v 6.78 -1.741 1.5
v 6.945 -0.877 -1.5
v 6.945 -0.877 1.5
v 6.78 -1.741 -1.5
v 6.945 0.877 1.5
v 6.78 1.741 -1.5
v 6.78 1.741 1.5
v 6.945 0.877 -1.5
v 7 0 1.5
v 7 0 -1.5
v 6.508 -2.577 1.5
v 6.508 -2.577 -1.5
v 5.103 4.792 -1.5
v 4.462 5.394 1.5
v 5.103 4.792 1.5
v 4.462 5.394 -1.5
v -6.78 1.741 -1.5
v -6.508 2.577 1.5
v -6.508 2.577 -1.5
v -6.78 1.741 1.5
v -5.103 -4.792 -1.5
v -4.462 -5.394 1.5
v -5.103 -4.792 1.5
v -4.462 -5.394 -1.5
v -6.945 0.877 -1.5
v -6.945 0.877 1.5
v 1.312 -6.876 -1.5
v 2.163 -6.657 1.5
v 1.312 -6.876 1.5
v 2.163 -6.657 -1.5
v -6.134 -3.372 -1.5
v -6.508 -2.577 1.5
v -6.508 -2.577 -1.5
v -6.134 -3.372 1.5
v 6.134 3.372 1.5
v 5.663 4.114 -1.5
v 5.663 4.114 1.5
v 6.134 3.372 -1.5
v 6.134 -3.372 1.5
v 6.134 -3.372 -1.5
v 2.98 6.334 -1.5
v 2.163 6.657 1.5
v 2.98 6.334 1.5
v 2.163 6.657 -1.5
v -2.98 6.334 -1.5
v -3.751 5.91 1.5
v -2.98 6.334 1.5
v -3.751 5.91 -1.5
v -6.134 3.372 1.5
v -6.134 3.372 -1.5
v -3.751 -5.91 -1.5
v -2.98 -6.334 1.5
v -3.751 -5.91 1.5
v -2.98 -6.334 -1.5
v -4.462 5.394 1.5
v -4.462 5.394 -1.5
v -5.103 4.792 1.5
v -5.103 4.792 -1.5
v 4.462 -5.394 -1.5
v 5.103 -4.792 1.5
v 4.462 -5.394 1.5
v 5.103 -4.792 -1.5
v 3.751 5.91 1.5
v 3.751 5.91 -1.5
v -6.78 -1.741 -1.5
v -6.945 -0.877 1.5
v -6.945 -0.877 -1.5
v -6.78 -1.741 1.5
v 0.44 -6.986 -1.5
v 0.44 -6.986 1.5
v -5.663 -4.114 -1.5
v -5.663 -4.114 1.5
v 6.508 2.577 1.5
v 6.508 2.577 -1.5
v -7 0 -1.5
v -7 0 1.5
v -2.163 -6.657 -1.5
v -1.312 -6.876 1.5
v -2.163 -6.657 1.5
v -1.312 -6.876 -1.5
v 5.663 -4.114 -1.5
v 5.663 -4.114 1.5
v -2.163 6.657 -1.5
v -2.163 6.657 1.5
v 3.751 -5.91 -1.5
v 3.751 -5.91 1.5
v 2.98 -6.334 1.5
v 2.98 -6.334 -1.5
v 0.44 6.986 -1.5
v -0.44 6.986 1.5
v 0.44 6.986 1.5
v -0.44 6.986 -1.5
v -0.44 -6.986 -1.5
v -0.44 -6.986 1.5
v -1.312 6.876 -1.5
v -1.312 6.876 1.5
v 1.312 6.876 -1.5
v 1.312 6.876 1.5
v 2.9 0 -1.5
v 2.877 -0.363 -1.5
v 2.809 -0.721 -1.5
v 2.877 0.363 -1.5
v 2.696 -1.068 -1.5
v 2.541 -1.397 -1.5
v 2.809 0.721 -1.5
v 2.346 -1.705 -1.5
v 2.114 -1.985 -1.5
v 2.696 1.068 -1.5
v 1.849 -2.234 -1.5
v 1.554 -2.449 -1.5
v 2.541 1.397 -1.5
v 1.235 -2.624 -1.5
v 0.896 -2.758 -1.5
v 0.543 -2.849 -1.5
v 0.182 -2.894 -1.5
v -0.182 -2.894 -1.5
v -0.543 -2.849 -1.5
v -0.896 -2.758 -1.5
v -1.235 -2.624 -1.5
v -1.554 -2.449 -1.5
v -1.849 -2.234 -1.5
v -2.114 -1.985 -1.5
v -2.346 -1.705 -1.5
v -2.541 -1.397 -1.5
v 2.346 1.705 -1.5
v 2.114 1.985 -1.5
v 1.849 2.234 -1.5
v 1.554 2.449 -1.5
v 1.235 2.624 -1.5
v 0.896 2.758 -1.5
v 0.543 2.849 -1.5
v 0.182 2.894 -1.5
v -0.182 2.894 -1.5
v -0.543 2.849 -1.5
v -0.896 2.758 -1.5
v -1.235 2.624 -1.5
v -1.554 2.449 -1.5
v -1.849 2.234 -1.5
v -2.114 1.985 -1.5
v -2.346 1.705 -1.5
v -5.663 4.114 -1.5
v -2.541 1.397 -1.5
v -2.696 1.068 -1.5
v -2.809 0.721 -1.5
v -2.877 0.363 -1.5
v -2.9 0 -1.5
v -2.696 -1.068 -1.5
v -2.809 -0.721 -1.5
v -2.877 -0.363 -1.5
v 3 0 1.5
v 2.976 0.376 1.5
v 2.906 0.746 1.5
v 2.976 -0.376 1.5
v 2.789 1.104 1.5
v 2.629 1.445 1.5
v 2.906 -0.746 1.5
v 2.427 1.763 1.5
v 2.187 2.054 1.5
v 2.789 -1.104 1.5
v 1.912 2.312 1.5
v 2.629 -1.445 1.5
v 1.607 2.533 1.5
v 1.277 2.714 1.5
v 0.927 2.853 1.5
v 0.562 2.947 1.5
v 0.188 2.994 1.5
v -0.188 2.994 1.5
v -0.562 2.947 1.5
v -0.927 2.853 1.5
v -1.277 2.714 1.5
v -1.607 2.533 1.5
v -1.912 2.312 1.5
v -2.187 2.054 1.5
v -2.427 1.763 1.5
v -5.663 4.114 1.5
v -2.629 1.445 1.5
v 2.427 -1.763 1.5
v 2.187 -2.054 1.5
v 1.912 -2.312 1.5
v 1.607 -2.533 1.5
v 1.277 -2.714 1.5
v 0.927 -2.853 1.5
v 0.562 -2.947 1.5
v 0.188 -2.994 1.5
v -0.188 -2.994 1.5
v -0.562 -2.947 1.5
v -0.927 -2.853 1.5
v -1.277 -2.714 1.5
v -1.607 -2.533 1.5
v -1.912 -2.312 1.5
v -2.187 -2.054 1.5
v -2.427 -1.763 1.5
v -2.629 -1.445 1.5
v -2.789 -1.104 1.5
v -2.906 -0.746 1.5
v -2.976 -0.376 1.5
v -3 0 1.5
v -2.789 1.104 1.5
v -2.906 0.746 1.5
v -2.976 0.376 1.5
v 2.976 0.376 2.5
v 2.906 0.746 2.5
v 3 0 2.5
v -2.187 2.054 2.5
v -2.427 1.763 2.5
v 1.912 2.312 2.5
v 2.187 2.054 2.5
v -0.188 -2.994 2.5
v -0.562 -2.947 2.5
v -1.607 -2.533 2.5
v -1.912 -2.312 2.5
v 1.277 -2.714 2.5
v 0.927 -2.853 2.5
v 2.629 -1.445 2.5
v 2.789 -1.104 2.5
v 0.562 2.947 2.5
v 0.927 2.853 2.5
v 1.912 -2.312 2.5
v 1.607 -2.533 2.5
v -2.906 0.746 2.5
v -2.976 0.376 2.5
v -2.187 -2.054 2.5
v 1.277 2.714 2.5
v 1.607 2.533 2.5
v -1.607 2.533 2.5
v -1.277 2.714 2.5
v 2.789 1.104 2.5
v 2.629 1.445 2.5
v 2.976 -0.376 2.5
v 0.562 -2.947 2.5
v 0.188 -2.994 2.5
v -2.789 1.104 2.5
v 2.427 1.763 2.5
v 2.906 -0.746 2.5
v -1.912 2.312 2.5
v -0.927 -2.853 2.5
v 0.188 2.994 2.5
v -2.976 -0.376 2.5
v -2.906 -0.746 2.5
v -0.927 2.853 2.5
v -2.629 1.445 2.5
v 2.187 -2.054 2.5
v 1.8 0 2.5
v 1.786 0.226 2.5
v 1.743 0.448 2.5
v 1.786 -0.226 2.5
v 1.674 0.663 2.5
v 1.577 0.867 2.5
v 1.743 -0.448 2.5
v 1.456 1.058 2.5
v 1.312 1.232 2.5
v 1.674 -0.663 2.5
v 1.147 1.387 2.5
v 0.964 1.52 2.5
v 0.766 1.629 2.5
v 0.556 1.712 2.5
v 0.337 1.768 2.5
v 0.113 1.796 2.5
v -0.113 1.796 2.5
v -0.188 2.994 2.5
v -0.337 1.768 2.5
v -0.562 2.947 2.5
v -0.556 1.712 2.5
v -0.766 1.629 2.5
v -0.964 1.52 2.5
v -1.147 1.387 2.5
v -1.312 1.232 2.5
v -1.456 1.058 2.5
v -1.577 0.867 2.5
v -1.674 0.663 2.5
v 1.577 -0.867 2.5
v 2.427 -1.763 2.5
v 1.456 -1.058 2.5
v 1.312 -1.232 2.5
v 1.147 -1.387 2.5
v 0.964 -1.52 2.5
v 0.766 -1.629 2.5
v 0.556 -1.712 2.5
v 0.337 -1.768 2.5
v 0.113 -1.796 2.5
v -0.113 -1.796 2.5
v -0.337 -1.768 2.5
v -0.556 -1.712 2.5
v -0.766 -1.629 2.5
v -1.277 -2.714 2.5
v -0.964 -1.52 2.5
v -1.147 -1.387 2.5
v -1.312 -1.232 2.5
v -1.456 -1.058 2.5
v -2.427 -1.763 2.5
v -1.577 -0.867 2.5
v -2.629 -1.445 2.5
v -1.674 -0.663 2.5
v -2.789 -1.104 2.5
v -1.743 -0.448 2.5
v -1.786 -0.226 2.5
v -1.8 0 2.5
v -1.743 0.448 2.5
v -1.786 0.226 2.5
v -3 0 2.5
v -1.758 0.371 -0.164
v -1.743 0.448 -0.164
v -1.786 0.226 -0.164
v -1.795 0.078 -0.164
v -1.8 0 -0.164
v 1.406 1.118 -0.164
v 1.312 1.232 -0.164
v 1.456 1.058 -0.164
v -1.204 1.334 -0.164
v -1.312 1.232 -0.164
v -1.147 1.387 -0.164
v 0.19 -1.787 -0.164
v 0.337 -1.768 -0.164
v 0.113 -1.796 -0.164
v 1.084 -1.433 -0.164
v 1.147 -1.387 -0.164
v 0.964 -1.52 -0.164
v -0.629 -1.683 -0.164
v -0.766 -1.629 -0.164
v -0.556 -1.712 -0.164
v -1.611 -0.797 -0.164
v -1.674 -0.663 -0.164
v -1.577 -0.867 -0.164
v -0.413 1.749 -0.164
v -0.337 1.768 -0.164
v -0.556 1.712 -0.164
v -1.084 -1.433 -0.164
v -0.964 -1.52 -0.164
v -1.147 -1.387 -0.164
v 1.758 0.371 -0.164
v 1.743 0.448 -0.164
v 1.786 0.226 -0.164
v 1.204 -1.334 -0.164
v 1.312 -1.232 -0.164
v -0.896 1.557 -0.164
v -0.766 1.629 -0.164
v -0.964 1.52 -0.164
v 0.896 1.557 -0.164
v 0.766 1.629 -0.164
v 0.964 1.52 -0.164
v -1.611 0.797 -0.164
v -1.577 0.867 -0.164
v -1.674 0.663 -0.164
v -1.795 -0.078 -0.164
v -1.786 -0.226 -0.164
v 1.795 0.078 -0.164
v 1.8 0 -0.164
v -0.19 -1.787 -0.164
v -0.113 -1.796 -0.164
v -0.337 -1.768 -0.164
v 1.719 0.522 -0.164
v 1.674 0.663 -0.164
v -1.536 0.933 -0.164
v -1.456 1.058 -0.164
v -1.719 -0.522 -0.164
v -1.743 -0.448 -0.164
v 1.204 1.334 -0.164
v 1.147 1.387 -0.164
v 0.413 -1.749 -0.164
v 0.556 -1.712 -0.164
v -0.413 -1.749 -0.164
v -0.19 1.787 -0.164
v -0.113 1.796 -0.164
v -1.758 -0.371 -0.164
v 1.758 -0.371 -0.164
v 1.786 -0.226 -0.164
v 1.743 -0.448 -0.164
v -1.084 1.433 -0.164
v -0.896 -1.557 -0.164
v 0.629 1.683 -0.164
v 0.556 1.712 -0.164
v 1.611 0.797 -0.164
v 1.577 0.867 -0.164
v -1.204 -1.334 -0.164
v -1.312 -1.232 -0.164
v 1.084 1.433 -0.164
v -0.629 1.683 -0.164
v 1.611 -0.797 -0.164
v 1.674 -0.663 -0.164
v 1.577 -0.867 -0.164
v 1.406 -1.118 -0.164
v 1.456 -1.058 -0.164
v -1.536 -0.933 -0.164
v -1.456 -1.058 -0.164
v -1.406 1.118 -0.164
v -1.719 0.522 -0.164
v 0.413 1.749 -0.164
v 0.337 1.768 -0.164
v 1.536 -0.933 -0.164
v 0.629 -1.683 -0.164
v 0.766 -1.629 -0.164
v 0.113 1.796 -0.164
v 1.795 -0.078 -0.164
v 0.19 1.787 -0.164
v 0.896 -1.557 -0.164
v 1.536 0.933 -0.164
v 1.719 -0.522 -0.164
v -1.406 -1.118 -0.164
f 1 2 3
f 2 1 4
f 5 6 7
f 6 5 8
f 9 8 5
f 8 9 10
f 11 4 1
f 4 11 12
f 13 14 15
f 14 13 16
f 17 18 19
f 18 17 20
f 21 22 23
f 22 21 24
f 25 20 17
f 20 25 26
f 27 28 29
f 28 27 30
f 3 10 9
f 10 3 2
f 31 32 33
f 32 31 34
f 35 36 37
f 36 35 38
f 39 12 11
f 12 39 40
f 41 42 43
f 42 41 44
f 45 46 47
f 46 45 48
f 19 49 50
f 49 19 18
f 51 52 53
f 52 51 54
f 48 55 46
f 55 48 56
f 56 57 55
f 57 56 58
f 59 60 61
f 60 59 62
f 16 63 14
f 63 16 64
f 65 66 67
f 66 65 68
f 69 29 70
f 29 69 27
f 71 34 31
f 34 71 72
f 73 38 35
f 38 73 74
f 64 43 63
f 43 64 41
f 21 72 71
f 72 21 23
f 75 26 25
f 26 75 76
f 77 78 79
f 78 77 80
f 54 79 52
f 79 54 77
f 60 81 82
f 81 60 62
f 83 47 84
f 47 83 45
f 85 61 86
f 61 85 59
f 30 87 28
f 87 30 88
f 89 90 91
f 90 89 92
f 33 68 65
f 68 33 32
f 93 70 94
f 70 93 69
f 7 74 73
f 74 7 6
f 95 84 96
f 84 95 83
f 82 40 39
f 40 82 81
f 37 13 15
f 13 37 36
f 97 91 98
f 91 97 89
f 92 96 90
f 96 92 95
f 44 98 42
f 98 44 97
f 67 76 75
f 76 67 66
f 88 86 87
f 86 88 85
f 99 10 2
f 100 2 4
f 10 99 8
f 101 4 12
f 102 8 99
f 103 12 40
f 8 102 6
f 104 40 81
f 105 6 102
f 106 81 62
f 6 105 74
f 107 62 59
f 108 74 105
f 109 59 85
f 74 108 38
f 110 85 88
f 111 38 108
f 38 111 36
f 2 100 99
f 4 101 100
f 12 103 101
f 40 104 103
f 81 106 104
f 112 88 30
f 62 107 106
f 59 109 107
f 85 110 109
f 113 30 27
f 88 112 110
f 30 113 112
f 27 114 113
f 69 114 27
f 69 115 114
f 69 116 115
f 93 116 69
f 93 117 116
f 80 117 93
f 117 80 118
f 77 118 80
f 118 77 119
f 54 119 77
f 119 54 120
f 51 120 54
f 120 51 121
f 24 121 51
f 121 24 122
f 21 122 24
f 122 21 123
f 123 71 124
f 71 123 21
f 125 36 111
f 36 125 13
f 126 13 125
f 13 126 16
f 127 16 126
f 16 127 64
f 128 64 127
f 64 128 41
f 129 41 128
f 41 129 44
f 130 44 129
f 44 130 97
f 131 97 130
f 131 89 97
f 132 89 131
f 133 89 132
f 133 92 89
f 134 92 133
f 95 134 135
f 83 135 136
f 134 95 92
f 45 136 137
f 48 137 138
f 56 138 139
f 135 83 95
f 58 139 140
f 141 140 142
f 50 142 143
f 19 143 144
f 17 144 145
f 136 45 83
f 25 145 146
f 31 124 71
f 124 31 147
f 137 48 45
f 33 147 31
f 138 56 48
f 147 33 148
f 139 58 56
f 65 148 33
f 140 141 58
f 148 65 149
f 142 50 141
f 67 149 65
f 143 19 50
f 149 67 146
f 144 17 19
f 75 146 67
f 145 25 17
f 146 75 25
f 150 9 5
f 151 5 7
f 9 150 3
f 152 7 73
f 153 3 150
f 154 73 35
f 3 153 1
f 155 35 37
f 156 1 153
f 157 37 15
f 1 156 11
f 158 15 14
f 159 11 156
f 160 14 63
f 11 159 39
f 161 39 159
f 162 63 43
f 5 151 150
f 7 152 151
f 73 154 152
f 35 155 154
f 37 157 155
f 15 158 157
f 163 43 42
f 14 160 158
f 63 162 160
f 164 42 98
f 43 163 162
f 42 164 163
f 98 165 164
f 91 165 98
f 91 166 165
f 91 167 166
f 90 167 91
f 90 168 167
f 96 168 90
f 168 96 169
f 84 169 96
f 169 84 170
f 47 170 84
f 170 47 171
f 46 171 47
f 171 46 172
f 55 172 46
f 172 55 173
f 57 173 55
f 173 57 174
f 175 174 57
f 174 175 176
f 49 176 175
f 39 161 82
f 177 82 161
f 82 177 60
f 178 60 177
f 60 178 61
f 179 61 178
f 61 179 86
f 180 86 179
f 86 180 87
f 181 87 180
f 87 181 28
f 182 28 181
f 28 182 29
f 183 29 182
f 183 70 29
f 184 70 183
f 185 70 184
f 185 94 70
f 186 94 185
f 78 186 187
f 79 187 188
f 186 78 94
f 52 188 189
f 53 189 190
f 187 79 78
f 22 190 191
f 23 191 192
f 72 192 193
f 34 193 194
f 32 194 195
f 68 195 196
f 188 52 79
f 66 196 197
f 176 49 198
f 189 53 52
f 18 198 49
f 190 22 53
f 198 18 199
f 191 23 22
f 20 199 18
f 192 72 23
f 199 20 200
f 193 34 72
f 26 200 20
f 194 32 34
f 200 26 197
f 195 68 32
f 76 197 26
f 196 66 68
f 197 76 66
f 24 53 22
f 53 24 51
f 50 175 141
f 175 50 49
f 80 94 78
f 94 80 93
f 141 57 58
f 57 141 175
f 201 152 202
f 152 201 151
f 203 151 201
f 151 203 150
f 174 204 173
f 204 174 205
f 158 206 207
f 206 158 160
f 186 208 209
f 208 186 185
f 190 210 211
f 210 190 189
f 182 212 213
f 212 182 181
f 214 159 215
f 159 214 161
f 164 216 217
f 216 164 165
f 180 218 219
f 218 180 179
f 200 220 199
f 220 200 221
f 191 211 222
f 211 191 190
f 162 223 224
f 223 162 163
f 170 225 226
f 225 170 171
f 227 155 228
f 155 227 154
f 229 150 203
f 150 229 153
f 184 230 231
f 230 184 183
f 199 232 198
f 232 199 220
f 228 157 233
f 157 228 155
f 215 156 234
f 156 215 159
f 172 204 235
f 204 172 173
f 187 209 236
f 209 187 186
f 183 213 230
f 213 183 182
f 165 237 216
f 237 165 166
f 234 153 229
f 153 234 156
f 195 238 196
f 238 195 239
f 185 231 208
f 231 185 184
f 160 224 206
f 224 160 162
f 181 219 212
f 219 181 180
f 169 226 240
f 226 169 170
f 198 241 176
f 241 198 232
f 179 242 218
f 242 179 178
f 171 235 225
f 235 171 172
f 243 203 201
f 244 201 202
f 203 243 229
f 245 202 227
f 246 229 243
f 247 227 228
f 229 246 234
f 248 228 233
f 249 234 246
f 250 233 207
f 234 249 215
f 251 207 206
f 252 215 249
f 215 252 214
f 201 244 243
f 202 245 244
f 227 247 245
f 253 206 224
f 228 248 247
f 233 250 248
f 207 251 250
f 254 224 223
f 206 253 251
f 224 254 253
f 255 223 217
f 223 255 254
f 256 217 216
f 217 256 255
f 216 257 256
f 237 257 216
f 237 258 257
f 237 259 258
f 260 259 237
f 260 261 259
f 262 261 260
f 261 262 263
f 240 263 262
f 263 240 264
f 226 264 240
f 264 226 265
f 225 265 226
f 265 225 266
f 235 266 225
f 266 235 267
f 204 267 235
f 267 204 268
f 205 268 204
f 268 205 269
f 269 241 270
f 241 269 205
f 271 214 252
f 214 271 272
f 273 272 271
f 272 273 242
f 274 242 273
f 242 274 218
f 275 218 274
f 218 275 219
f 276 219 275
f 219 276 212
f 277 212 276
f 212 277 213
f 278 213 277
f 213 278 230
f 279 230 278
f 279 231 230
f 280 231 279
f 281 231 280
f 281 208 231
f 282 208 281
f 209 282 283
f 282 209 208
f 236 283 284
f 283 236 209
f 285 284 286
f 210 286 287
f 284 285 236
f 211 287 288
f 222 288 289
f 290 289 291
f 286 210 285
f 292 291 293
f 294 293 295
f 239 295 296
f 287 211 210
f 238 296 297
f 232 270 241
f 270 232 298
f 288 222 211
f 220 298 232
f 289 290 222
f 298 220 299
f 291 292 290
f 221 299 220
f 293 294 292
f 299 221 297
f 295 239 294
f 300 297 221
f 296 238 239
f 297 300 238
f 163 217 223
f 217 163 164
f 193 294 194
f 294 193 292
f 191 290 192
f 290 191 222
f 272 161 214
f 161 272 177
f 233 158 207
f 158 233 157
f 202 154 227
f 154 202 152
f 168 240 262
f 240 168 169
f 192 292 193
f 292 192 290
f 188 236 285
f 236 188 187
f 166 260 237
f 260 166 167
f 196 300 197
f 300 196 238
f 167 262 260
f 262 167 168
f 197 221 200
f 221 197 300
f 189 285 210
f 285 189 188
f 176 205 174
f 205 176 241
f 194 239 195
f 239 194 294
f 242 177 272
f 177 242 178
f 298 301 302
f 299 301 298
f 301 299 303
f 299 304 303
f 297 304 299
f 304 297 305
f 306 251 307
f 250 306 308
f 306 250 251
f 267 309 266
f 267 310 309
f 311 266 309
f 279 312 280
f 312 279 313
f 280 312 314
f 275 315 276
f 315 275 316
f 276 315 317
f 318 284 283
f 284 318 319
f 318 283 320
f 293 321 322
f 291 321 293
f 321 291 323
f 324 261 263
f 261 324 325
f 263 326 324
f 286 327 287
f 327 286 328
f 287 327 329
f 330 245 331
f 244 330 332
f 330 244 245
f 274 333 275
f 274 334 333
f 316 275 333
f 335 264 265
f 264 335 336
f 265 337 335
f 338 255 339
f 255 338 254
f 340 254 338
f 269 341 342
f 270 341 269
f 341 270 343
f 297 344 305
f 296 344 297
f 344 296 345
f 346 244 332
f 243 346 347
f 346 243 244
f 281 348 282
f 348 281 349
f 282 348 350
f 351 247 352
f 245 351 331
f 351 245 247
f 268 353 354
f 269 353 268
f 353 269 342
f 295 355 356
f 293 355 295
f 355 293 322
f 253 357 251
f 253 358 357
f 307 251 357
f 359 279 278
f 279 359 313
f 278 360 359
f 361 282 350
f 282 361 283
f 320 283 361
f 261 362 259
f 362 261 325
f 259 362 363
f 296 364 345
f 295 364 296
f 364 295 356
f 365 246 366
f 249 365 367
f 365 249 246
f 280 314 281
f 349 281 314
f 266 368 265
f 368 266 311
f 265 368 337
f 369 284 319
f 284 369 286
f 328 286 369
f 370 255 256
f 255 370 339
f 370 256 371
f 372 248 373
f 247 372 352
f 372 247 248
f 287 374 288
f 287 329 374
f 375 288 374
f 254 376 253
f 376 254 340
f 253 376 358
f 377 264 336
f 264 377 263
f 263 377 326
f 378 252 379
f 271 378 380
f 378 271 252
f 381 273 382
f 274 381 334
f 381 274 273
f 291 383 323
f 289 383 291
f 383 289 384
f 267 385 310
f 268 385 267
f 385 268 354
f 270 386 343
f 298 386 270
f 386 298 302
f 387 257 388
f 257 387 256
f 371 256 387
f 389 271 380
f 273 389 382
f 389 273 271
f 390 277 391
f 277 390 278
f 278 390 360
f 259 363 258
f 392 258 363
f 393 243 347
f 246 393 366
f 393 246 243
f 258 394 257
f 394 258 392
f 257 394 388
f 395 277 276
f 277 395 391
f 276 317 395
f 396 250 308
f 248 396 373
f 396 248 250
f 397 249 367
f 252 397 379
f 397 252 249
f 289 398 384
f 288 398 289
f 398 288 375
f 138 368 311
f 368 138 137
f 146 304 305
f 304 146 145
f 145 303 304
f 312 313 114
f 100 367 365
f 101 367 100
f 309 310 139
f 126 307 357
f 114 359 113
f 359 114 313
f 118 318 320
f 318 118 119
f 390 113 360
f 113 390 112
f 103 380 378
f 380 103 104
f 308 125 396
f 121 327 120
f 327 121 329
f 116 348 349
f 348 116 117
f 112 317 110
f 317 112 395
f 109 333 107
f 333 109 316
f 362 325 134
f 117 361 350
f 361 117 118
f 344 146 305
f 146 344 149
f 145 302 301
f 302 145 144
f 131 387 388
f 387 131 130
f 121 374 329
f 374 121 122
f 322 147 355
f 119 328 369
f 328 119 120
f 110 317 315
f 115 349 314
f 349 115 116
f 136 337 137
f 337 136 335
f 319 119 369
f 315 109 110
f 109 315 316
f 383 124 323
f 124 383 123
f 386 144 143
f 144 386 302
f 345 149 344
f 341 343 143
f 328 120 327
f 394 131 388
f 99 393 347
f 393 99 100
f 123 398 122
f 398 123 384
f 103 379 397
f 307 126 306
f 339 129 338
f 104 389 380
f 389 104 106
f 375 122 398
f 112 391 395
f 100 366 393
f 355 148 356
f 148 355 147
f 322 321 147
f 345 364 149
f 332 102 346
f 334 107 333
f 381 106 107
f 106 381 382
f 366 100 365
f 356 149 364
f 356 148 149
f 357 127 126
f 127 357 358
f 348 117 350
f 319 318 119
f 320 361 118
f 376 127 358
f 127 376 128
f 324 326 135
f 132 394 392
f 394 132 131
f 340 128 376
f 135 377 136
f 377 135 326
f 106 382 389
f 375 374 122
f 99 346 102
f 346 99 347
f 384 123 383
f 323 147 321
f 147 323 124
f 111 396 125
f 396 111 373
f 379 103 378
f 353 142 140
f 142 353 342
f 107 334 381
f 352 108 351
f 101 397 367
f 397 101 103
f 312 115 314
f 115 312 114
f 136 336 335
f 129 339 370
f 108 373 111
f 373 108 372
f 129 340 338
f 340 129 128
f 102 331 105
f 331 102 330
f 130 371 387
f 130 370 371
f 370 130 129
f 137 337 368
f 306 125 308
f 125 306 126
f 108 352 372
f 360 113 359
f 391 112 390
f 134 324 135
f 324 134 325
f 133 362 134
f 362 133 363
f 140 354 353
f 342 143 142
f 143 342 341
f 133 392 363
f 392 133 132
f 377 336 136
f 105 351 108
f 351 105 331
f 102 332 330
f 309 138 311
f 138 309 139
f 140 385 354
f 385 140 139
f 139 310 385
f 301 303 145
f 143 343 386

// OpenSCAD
$fn = 50;


difference() {
	union() {
		translate(v = [0, 0, -1.5000000000]) {
			cylinder(h = 3, r = 7.0000000000);
		}
		translate(v = [0, 0, -1.5000000000]) {
			cylinder(h = 4, r = 3.0000000000);
		}
	}
	union() {
		translate(v = [0, 0, -1.5000000000]) {
			rotate(a = [0, 180, 0]) {
				difference() {
					union() {
						translate(v = [0, 0, -4.0000000000]) {
							cylinder(h = 4, r = 1.5000000000);
						}
						translate(v = [0, 0, -4.0000000000]) {
							cylinder(h = 4, r = 1.8000000000);
						}
						translate(v = [0, 0, -1.7000000000]) {
							cylinder(h = 1.7000000000, r1 = 1.5000000000, r2 = 2.9000000000);
						}
						translate(v = [0, 0, -4.0000000000]) {
							cylinder(h = 4, r = 1.5000000000);
						}
					}
					union();
				}
			}
		}
		translate(v = [0, 0, -50.0000000000]) {
			cylinder(h = 100, r = 1.5000000000);
		}
	}
}
